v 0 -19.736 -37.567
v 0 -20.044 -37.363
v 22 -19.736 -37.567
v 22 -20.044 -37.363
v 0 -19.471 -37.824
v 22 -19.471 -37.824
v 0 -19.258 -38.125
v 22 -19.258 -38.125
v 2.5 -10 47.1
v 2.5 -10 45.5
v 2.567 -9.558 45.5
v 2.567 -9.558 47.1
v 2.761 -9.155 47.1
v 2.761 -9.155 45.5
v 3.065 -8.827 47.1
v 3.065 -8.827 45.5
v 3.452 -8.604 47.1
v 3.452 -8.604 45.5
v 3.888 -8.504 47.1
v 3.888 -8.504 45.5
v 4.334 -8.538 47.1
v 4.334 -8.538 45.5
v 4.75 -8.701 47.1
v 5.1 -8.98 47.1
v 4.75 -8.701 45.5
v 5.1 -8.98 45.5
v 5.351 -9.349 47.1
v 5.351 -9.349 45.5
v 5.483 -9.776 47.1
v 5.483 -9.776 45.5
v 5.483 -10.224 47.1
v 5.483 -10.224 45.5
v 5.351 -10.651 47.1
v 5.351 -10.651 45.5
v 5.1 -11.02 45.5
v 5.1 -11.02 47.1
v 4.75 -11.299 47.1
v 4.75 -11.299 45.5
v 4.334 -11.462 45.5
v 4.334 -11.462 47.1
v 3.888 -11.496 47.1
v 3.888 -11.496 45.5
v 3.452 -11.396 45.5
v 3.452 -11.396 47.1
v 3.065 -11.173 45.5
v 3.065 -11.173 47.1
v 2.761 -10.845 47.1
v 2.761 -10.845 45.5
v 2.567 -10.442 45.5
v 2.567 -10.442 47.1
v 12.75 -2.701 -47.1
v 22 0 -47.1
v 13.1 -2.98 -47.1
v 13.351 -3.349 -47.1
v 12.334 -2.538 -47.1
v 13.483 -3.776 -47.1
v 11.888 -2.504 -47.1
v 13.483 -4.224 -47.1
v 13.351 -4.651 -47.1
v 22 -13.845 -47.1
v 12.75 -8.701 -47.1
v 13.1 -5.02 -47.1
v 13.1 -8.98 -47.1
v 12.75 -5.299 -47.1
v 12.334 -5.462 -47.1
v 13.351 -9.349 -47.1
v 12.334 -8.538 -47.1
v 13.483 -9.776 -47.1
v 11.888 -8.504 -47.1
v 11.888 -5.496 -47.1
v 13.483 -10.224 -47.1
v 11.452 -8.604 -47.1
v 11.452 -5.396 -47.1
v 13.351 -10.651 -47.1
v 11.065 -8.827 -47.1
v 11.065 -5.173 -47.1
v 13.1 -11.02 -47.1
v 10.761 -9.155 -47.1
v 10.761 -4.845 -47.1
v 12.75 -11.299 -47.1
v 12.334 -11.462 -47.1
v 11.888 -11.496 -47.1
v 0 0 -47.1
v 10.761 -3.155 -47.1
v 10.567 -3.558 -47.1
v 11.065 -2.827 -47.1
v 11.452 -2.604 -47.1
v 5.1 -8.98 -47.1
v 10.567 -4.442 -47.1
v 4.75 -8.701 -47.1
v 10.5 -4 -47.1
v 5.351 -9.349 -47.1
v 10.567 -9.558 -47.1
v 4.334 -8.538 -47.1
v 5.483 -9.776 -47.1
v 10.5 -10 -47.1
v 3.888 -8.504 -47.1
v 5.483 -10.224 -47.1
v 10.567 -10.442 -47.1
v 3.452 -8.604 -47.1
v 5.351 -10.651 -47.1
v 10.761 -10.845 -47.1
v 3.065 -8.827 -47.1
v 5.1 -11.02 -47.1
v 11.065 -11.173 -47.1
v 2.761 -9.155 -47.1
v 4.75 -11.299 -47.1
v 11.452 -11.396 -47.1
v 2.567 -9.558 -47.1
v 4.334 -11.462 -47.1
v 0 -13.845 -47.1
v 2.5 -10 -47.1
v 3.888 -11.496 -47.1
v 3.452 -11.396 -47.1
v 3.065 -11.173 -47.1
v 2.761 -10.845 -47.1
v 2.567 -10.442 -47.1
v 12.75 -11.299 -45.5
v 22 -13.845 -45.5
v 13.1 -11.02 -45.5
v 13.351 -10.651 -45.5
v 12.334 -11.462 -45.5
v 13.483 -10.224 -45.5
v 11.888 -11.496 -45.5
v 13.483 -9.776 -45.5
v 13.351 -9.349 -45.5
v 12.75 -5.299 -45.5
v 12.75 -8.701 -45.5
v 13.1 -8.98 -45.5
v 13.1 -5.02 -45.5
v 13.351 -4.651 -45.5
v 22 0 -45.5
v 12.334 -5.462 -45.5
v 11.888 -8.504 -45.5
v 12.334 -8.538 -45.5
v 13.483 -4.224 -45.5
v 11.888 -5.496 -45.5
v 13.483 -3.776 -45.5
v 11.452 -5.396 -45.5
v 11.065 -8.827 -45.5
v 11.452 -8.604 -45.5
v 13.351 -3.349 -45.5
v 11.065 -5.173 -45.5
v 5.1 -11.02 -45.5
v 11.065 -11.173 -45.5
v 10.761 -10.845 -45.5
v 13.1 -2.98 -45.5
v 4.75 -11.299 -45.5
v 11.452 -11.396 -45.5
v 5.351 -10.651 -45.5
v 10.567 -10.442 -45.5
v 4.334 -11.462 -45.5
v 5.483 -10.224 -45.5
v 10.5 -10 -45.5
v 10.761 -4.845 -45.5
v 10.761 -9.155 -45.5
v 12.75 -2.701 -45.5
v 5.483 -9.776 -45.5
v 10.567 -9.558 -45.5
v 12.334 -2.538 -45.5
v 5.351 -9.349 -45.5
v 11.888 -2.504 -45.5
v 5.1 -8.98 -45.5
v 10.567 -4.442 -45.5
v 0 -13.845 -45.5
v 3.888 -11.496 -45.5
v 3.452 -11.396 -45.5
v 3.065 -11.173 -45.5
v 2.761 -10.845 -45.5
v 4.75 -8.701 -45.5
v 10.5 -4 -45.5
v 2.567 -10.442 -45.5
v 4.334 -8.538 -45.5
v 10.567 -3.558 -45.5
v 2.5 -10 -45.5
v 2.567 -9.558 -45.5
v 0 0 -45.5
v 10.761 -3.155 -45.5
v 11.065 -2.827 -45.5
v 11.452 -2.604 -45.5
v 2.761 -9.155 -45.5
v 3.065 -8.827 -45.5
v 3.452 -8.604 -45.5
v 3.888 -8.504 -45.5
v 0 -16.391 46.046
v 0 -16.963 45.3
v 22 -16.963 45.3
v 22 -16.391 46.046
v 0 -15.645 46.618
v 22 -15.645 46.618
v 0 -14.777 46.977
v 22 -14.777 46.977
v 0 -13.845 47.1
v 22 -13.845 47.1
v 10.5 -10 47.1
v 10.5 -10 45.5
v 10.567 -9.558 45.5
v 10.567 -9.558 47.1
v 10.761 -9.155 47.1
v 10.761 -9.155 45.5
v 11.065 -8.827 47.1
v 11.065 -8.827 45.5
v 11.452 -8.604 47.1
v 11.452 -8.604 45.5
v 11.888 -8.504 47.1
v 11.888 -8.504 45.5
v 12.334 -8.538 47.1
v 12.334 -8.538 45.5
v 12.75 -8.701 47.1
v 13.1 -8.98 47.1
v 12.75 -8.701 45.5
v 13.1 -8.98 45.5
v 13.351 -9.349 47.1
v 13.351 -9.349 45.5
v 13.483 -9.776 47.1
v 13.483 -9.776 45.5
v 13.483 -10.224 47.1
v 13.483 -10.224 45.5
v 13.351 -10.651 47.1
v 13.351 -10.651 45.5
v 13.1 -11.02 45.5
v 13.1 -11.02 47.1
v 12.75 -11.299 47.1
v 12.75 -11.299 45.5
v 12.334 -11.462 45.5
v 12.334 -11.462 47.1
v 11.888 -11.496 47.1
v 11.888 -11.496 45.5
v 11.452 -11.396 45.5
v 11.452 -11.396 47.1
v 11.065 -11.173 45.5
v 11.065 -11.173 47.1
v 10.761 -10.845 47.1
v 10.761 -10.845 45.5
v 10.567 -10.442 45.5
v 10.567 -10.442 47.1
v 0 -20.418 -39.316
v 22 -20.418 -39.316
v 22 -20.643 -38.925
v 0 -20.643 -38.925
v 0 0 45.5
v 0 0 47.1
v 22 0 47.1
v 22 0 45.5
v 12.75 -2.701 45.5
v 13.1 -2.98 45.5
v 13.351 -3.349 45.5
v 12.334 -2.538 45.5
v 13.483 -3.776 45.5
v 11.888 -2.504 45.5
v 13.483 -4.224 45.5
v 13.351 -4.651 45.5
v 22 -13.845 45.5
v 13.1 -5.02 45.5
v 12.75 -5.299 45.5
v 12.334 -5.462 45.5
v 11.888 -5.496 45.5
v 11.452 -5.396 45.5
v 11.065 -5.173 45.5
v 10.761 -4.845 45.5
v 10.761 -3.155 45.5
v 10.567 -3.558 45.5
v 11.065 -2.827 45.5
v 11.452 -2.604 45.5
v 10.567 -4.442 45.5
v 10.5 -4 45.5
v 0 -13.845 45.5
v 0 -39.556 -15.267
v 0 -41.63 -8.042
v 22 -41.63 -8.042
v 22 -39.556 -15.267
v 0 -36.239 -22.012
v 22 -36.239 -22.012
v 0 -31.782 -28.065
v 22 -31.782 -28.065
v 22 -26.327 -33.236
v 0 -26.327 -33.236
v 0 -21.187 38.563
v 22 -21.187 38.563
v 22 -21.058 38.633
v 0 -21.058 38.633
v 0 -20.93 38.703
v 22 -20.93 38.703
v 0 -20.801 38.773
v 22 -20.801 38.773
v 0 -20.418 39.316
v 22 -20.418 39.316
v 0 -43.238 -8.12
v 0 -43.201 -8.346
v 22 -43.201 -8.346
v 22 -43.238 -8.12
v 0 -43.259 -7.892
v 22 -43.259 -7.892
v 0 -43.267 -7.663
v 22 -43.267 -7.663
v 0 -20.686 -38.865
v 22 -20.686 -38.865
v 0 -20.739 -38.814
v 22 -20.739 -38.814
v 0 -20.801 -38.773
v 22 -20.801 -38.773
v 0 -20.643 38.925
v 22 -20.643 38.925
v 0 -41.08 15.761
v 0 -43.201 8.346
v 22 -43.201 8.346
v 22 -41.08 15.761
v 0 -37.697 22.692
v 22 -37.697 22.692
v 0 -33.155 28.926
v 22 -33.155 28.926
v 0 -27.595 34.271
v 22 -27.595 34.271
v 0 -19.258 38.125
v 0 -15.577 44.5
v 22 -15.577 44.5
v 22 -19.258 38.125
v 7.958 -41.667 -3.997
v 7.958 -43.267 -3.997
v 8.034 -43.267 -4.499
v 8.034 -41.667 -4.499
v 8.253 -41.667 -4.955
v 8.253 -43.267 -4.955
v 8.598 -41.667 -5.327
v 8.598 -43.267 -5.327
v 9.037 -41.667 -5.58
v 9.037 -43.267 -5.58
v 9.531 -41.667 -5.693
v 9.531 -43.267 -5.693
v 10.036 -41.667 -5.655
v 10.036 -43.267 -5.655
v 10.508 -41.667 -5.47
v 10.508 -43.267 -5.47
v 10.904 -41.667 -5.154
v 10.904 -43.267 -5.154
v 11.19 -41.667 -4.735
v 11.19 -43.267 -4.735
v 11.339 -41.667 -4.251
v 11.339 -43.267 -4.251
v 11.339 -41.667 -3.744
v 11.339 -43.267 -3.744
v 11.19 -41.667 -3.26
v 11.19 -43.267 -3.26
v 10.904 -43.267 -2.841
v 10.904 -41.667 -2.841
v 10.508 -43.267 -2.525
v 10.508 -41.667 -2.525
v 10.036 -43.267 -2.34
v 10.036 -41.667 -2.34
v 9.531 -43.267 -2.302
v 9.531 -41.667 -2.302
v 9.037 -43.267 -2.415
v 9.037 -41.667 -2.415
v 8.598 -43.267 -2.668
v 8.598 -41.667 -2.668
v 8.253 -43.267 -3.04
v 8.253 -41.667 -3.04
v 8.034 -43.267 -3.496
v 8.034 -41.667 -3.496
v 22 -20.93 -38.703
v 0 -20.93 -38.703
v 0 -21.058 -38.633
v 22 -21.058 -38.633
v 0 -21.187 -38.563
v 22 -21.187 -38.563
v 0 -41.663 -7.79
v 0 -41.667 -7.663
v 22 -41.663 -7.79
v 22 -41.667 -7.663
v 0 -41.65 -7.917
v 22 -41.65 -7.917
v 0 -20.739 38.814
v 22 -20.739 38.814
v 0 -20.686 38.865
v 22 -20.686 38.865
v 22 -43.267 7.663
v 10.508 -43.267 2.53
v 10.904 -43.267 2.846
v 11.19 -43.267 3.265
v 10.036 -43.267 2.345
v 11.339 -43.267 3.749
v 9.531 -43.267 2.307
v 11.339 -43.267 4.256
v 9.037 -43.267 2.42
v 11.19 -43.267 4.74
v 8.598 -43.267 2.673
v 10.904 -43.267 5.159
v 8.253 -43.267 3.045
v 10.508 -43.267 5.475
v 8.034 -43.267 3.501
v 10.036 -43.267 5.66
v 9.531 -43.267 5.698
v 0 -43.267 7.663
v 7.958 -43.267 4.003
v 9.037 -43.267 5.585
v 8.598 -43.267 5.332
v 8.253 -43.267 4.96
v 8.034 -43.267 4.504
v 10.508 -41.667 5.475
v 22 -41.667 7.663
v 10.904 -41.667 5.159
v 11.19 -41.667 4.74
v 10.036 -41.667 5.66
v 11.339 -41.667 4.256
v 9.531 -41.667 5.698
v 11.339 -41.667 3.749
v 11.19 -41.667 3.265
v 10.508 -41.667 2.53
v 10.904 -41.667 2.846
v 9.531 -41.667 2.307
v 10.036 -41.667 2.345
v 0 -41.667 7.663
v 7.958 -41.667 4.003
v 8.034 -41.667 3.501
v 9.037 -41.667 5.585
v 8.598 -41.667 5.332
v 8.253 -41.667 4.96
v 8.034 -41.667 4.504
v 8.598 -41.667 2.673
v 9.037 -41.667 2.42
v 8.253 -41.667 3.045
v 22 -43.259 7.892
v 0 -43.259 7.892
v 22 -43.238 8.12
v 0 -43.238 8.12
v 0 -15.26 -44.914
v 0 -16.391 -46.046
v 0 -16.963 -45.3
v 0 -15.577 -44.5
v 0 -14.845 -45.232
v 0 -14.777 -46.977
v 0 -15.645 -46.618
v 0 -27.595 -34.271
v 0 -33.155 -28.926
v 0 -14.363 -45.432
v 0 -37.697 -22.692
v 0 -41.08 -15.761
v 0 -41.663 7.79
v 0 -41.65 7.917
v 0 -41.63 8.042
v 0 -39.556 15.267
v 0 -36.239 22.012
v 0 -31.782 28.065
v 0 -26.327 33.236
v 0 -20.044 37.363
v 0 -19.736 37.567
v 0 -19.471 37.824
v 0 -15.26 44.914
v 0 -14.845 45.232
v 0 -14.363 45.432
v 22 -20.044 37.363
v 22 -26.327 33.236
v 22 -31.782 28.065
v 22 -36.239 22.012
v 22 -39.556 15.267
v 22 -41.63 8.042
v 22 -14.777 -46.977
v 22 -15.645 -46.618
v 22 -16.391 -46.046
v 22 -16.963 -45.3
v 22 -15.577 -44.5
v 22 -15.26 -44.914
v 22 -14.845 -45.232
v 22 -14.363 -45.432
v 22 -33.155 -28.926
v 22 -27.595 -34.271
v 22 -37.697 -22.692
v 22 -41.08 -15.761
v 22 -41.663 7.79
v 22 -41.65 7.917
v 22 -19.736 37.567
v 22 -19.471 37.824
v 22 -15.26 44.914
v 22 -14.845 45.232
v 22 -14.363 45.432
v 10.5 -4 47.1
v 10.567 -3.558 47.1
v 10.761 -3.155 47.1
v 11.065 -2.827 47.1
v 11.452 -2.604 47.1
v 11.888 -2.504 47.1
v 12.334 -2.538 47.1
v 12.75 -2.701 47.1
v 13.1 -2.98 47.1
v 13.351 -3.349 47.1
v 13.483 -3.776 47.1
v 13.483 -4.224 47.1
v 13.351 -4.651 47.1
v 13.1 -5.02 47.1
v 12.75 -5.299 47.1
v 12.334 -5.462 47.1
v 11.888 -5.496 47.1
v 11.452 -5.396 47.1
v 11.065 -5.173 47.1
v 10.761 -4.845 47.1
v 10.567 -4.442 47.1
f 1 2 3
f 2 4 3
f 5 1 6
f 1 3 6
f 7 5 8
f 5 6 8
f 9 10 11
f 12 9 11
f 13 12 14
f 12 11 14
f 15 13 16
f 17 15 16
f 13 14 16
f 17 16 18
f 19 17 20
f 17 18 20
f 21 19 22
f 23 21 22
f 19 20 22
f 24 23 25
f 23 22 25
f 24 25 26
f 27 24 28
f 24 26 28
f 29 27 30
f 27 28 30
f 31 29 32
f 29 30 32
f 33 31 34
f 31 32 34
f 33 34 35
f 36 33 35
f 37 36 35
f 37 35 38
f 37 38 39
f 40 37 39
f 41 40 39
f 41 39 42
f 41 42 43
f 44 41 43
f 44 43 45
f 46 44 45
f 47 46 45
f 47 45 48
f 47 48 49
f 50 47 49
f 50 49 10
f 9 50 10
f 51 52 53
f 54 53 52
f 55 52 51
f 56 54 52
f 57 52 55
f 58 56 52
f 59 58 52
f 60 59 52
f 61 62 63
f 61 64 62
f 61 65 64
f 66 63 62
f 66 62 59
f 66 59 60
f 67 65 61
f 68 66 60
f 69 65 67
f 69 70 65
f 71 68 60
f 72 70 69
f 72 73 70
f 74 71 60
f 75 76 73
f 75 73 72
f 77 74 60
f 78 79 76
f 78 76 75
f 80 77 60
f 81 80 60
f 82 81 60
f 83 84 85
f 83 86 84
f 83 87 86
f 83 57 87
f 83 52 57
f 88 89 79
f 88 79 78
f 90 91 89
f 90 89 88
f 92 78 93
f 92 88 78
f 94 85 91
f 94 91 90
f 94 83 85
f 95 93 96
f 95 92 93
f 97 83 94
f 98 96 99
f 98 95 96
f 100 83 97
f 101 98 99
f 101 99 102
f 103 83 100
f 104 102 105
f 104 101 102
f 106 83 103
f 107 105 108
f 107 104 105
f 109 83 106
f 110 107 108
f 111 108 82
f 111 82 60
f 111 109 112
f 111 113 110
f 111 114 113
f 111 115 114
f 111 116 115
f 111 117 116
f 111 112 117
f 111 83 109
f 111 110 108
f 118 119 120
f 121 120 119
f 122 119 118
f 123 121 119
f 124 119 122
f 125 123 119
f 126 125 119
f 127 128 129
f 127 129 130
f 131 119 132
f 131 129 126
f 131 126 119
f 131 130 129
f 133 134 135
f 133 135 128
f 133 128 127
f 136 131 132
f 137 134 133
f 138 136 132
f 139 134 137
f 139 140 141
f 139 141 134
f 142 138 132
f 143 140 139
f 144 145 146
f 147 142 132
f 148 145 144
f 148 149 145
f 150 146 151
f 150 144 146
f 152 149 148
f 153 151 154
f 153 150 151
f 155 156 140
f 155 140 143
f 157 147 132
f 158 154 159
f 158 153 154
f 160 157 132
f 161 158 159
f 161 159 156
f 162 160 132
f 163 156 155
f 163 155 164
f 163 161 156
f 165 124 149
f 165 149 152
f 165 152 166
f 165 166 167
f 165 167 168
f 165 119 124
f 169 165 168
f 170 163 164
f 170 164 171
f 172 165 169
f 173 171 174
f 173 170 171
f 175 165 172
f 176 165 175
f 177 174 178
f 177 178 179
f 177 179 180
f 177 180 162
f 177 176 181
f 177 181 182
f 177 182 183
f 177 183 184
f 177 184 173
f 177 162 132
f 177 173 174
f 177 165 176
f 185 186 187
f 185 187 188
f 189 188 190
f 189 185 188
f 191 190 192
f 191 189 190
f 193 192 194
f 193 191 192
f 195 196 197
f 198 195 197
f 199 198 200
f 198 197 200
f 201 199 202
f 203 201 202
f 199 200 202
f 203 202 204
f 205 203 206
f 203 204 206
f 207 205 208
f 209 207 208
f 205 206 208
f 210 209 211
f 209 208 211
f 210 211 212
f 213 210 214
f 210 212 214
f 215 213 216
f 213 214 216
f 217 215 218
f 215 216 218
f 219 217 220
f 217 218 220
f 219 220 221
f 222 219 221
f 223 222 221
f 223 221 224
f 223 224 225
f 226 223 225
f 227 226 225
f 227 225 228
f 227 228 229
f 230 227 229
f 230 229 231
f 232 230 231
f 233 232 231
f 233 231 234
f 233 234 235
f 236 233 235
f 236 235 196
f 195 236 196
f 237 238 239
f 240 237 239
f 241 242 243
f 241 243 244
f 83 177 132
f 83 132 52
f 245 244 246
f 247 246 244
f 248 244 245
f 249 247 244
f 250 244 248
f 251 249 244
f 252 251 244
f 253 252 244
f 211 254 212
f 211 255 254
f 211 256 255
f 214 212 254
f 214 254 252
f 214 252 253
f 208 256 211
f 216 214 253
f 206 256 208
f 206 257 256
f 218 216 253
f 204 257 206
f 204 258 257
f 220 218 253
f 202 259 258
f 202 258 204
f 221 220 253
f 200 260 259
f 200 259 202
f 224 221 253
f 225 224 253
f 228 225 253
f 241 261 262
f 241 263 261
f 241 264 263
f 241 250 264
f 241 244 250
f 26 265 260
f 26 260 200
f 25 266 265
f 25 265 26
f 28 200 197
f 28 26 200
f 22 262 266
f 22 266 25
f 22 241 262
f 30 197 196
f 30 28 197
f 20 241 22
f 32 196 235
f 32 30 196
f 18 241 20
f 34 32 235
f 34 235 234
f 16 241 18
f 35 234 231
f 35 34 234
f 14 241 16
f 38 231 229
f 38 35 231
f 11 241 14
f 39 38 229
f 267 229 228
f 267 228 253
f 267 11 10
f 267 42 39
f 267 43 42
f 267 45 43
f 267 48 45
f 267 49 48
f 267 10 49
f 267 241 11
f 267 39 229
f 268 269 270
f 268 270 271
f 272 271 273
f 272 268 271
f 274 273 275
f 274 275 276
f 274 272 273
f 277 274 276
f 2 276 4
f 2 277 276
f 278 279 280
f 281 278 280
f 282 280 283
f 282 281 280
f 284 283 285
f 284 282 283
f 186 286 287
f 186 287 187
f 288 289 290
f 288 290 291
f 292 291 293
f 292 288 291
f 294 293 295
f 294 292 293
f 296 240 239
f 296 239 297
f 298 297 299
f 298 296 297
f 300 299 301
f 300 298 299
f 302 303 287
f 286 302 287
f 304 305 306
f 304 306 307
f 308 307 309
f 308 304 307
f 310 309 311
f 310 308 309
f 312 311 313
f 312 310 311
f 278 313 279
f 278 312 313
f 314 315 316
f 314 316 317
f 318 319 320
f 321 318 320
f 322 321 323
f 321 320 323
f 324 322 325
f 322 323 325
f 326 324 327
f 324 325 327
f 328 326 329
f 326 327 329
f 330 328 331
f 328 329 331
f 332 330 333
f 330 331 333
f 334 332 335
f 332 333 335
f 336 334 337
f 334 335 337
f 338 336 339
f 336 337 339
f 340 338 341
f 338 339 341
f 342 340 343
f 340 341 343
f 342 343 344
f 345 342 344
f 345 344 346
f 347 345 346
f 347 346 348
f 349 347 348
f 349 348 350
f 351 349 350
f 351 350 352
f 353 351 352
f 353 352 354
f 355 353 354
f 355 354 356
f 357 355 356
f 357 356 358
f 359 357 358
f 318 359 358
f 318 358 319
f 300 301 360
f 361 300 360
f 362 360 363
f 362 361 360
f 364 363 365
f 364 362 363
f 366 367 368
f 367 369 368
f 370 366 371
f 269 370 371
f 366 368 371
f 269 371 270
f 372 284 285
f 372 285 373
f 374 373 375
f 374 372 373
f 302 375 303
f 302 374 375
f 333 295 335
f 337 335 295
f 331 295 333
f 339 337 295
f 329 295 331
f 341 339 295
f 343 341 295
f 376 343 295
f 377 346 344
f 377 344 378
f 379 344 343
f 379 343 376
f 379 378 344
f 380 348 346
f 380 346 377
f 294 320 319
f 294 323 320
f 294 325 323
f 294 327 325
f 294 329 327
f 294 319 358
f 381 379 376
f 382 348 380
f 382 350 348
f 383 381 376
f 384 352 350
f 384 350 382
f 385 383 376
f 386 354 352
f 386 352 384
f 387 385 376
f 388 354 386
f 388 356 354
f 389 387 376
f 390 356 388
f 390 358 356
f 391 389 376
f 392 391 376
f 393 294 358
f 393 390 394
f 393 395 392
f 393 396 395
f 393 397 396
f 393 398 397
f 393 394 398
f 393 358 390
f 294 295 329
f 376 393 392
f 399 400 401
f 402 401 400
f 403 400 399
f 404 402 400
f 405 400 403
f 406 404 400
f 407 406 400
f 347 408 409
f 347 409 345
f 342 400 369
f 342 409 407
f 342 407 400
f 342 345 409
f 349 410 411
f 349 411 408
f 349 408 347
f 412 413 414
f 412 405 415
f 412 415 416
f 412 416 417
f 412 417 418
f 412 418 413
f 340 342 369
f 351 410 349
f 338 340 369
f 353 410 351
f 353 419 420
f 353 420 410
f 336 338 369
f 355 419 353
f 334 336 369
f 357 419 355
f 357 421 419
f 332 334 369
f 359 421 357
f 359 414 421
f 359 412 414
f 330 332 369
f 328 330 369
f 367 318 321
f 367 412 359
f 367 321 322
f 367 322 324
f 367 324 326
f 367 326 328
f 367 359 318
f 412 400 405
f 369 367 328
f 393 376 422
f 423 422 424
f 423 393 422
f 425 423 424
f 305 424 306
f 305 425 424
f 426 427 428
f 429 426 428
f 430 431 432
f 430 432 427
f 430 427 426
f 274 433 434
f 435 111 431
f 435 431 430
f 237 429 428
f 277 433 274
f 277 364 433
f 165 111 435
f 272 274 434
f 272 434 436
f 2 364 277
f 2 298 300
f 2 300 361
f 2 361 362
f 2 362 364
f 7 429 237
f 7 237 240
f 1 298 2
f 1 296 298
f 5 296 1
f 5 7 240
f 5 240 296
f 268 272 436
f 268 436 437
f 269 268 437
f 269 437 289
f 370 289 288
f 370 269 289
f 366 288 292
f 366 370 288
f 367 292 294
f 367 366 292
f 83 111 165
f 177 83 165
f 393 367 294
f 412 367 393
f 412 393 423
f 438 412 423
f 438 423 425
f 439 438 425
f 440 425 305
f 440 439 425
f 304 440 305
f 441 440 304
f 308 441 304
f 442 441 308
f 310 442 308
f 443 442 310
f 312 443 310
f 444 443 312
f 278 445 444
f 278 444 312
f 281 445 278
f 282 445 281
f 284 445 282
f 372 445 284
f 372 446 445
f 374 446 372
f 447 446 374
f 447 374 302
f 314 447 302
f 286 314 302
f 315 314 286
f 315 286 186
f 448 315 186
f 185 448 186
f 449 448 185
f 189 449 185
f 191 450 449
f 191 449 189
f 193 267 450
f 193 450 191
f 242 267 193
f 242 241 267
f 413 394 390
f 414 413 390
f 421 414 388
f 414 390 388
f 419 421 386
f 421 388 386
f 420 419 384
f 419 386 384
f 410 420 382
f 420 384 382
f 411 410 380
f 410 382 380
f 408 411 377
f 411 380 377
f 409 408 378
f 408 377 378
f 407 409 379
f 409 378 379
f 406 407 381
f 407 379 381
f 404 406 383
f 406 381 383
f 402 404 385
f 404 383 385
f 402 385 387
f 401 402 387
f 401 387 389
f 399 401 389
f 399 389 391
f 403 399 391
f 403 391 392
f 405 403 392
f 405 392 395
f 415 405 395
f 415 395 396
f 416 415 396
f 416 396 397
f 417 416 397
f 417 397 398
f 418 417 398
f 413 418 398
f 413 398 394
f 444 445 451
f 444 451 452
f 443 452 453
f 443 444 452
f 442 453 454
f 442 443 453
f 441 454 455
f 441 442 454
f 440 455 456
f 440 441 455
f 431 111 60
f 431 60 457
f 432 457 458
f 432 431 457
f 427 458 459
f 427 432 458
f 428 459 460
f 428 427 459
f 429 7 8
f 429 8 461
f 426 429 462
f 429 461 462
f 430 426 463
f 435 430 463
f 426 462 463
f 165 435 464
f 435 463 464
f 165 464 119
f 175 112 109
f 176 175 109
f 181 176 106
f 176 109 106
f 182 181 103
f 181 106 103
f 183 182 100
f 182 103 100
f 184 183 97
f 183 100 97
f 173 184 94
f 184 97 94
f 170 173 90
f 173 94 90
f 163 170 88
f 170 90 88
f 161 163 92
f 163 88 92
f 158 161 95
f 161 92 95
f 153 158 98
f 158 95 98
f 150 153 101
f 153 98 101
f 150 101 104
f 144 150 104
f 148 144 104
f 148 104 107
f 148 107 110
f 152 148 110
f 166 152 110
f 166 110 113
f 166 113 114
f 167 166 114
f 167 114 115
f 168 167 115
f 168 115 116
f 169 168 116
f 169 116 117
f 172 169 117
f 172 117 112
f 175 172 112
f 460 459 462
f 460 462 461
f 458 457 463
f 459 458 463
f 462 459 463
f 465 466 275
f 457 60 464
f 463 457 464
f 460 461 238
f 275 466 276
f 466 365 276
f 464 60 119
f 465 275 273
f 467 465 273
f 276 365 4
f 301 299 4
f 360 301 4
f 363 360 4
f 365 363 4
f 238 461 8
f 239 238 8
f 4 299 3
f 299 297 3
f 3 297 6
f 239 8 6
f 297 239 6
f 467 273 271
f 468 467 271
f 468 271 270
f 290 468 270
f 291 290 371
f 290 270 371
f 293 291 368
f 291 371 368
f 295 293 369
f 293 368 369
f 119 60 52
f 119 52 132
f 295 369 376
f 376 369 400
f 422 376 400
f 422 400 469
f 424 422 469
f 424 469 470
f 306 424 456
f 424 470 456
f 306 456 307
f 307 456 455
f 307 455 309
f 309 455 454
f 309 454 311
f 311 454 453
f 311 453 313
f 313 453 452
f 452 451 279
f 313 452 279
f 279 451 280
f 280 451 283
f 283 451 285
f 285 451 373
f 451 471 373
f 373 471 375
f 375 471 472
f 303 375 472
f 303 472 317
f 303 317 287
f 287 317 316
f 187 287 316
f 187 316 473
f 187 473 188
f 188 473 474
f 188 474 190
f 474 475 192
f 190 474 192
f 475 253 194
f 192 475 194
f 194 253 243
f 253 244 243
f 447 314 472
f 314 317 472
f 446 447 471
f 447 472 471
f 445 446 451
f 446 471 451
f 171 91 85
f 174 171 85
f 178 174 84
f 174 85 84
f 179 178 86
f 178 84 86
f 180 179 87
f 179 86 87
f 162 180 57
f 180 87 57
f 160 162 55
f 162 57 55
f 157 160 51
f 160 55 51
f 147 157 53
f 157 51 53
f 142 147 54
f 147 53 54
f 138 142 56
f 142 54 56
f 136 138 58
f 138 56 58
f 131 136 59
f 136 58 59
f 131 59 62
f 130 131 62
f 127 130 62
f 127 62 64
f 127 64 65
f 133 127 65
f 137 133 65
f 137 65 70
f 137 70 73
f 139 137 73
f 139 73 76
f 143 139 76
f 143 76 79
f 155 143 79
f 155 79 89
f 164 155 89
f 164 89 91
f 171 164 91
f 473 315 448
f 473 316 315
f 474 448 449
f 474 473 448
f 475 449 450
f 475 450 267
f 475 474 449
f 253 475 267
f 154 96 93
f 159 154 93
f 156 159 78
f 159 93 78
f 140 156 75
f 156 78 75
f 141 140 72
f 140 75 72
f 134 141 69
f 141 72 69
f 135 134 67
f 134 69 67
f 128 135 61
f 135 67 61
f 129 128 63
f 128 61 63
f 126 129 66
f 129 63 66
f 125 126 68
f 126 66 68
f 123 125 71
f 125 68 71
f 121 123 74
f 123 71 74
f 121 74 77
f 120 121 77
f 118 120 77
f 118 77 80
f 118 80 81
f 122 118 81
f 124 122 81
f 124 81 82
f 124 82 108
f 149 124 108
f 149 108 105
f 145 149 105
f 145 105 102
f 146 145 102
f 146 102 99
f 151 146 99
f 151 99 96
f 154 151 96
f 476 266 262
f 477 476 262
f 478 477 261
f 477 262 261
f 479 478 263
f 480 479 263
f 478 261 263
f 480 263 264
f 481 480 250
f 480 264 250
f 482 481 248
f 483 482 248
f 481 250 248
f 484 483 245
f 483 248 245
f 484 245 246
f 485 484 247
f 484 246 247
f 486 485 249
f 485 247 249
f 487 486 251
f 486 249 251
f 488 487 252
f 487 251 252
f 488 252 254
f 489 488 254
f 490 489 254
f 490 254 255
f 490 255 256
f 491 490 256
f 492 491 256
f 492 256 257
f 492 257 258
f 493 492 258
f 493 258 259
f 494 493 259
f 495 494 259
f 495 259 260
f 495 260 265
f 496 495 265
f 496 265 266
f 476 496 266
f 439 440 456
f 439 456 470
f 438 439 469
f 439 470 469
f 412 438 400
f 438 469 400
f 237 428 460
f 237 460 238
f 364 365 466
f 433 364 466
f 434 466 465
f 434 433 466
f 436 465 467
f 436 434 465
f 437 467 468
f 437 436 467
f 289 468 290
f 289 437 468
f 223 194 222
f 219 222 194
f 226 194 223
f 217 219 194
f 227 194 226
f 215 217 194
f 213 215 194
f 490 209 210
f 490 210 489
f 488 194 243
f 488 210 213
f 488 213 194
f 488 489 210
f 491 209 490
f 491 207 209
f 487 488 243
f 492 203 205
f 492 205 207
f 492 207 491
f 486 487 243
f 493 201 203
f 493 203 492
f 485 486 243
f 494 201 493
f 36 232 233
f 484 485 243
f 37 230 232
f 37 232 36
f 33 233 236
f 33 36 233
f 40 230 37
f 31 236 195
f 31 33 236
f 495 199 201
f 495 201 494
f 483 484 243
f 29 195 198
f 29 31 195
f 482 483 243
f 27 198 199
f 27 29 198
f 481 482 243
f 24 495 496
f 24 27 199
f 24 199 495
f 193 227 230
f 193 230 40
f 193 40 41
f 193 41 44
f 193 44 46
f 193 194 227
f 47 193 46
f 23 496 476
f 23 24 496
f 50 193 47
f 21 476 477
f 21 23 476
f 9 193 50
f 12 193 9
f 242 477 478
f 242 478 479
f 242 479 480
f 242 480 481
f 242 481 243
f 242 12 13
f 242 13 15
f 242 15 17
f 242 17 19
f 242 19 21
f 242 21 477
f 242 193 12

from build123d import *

# Parameters (mm, degrees)
BOSS_EXTRUDE1_DEPTH   = 22
FILLET1_R             = 2
F_3_0MM_DOWEL_HOLE2_D = 3
CONVERT_SOLID1_DEPTH  = 22
M3_CLEARANCE_HOLE1_D  = 3.4


# Read off the part's stored shape, not the designer's step: Convert-Solid1
with BuildPart() as part:
    # Sketch1 → Boss-Extrude1 (new body)
    with BuildSketch(Plane(origin=(0, 0, 0), x_dir=(0, 0, -1), z_dir=(1, 0, 0))):
        with BuildLine():
            Line((-45.5, -15), (-37.62592062, -19.54610185))
            ThreePointArc((-37.62592062, -19.54610185), (-25.286133167, -34.034856683), (-7.851953195, -41.666615306))
            Line((-7.851953195, -41.666615306), (7.851953195, -41.666615306))
            ThreePointArc((7.851953195, -41.666615306), (25.286133167, -34.034856683), (37.62592062, -19.54610185))
            Line((37.62592062, -19.54610185), (45.5, -15))
            Line((45.5, -15), (45.5, 0))
            Line((45.5, 0), (47.1, 0))
            Line((47.1, 0), (47.1, -15.923760431))
            Line((47.1, -15.923760431), (38.826379575, -20.70053741))
            ThreePointArc((38.826379575, -20.70053741), (25.990083184, -35.503740311), (8, -43.266615306))
            Line((8, -43.266615306), (-8, -43.266615306))
            ThreePointArc((-8, -43.266615306), (-25.990083184, -35.503740311), (-38.826379575, -20.70053741))
            Line((-38.826379575, -20.70053741), (-47.1, -15.923760431))
            Line((-47.1, -15.923760431), (-47.1, 0))
            Line((-47.1, 0), (-45.5, 0))
            Line((-45.5, 0), (-45.5, -15))
        make_face()
    extrude(amount=BOSS_EXTRUDE1_DEPTH)

    # Fillet1
    fillet1_edges = [part.edges().sort_by_distance(p)[0] for p in [
        (11, -15.923760431, 47.1),
        (11, -15, 45.5),
        (11, -19.54610185, 37.62592062),
        (11, -41.666615306, 7.851953195),
        (11, -41.666615306, -7.851953195),
        (11, -19.54610185, -37.62592062),
        (11, -15, -45.5),
        (11, -15.923760431, -47.1),
        (11, -20.70053741, -38.826379575),
        (11, -43.266615306, -8),
        (11, -43.266615306, 8),
        (11, -20.70053741, 38.826379575),
    ]]
    fillet(fillet1_edges, radius=FILLET1_R)

    # Ø3.0mm Dowel Hole2 (through all)
    with Locations(Plane.XY.offset(47.1)):
        with Locations((4, -10), (12, -10), (12, -4)):
            Hole(F_3_0MM_DOWEL_HOLE2_D / 2)

    # Convert-Solid1 outline → Convert-Solid1 (cut)
    with BuildSketch(Plane.YZ):
        with BuildLine():
            ThreePointArc((-13.845299462, -47.1), (-15.645299462, -46.617691454), (-16.962990915, -45.3))
            Line((-16.962990915, -45.3), (-16.5011107, -46.1))
            ThreePointArc((-16.5011107, -46.1), (-15.769059892, -46.832050808), (-14.769059892, -47.1))
            Line((-14.769059892, -47.1), (-13.845299462, -47.1))
        make_face()
        with BuildLine():
            Line((-16.5011107, 46.1), (-16.962990915, 45.3))
            ThreePointArc((-16.962990915, 45.3), (-15.645299462, 46.617691454), (-13.845299462, 47.1))
            Line((-13.845299462, 47.1), (-14.769059892, 47.1))
            ThreePointArc((-14.769059892, 47.1), (-15.769059892, 46.832050808), (-16.5011107, 46.1))
        make_face()
        with BuildLine():
            ThreePointArc((-20.41783584, 39.316033057), (-20.750751076, 38.886900575), (-21.186848098, 38.563162055))
            ThreePointArc((-21.186848098, 38.563162055), (-20.994067, 38.668451622), (-20.800762672, 38.772777464))
            ThreePointArc((-20.800762672, 38.772777464), (-20.711463806, 38.838037356), (-20.643450353, 38.925257259))
            Line((-20.643450353, 38.925257259), (-20.41783584, 39.316033057))
        make_face()
        with BuildLine():
            Line((-43.266615306, 7.814503261), (-43.266615306, 7.662873495))
            ThreePointArc((-43.266615306, 7.662873495), (-43.250240286, 8.005848713), (-43.201264194, 8.345703806))
            ThreePointArc((-43.201264194, 8.345703806), (-43.216551408, 8.266177136), (-43.231692225, 8.186622464))
            ThreePointArc((-43.231692225, 8.186622464), (-43.257865395, 8.001380442), (-43.266615306, 7.814503261))
        make_face()
        with BuildLine():
            ThreePointArc((-43.231692225, -8.186622464), (-43.216551408, -8.266177136), (-43.201264194, -8.345703806))
            ThreePointArc((-43.201264194, -8.345703806), (-43.250240286, -8.005848713), (-43.266615306, -7.662873495))
            Line((-43.266615306, -7.662873495), (-43.266615306, -7.814503261))
            ThreePointArc((-43.266615306, -7.814503261), (-43.257865395, -8.001380442), (-43.231692225, -8.186622464))
        make_face()
        with BuildLine():
            ThreePointArc((-21.186848098, -38.563162055), (-20.750751076, -38.886900575), (-20.41783584, -39.316033057))
            Line((-20.41783584, -39.316033057), (-20.643450353, -38.925257259))
            ThreePointArc((-20.643450353, -38.925257259), (-20.711463806, -38.838037356), (-20.800762672, -38.772777464))
            ThreePointArc((-20.800762672, -38.772777464), (-20.994067, -38.668451622), (-21.186848098, -38.563162055))
        make_face()
    extrude(amount=CONVERT_SOLID1_DEPTH, mode=Mode.SUBTRACT)

    # M3 Clearance Hole1 (through all)
    with Locations(Plane(origin=(0, -41.666615306, 0), x_dir=(1, 0, 0), z_dir=(0, 1, 0))):
        with Locations((9.658073919, -4.00254861), (9.658073919, 3.99745139)):
            Hole(M3_CLEARANCE_HOLE1_D / 2)


solid = part.part
